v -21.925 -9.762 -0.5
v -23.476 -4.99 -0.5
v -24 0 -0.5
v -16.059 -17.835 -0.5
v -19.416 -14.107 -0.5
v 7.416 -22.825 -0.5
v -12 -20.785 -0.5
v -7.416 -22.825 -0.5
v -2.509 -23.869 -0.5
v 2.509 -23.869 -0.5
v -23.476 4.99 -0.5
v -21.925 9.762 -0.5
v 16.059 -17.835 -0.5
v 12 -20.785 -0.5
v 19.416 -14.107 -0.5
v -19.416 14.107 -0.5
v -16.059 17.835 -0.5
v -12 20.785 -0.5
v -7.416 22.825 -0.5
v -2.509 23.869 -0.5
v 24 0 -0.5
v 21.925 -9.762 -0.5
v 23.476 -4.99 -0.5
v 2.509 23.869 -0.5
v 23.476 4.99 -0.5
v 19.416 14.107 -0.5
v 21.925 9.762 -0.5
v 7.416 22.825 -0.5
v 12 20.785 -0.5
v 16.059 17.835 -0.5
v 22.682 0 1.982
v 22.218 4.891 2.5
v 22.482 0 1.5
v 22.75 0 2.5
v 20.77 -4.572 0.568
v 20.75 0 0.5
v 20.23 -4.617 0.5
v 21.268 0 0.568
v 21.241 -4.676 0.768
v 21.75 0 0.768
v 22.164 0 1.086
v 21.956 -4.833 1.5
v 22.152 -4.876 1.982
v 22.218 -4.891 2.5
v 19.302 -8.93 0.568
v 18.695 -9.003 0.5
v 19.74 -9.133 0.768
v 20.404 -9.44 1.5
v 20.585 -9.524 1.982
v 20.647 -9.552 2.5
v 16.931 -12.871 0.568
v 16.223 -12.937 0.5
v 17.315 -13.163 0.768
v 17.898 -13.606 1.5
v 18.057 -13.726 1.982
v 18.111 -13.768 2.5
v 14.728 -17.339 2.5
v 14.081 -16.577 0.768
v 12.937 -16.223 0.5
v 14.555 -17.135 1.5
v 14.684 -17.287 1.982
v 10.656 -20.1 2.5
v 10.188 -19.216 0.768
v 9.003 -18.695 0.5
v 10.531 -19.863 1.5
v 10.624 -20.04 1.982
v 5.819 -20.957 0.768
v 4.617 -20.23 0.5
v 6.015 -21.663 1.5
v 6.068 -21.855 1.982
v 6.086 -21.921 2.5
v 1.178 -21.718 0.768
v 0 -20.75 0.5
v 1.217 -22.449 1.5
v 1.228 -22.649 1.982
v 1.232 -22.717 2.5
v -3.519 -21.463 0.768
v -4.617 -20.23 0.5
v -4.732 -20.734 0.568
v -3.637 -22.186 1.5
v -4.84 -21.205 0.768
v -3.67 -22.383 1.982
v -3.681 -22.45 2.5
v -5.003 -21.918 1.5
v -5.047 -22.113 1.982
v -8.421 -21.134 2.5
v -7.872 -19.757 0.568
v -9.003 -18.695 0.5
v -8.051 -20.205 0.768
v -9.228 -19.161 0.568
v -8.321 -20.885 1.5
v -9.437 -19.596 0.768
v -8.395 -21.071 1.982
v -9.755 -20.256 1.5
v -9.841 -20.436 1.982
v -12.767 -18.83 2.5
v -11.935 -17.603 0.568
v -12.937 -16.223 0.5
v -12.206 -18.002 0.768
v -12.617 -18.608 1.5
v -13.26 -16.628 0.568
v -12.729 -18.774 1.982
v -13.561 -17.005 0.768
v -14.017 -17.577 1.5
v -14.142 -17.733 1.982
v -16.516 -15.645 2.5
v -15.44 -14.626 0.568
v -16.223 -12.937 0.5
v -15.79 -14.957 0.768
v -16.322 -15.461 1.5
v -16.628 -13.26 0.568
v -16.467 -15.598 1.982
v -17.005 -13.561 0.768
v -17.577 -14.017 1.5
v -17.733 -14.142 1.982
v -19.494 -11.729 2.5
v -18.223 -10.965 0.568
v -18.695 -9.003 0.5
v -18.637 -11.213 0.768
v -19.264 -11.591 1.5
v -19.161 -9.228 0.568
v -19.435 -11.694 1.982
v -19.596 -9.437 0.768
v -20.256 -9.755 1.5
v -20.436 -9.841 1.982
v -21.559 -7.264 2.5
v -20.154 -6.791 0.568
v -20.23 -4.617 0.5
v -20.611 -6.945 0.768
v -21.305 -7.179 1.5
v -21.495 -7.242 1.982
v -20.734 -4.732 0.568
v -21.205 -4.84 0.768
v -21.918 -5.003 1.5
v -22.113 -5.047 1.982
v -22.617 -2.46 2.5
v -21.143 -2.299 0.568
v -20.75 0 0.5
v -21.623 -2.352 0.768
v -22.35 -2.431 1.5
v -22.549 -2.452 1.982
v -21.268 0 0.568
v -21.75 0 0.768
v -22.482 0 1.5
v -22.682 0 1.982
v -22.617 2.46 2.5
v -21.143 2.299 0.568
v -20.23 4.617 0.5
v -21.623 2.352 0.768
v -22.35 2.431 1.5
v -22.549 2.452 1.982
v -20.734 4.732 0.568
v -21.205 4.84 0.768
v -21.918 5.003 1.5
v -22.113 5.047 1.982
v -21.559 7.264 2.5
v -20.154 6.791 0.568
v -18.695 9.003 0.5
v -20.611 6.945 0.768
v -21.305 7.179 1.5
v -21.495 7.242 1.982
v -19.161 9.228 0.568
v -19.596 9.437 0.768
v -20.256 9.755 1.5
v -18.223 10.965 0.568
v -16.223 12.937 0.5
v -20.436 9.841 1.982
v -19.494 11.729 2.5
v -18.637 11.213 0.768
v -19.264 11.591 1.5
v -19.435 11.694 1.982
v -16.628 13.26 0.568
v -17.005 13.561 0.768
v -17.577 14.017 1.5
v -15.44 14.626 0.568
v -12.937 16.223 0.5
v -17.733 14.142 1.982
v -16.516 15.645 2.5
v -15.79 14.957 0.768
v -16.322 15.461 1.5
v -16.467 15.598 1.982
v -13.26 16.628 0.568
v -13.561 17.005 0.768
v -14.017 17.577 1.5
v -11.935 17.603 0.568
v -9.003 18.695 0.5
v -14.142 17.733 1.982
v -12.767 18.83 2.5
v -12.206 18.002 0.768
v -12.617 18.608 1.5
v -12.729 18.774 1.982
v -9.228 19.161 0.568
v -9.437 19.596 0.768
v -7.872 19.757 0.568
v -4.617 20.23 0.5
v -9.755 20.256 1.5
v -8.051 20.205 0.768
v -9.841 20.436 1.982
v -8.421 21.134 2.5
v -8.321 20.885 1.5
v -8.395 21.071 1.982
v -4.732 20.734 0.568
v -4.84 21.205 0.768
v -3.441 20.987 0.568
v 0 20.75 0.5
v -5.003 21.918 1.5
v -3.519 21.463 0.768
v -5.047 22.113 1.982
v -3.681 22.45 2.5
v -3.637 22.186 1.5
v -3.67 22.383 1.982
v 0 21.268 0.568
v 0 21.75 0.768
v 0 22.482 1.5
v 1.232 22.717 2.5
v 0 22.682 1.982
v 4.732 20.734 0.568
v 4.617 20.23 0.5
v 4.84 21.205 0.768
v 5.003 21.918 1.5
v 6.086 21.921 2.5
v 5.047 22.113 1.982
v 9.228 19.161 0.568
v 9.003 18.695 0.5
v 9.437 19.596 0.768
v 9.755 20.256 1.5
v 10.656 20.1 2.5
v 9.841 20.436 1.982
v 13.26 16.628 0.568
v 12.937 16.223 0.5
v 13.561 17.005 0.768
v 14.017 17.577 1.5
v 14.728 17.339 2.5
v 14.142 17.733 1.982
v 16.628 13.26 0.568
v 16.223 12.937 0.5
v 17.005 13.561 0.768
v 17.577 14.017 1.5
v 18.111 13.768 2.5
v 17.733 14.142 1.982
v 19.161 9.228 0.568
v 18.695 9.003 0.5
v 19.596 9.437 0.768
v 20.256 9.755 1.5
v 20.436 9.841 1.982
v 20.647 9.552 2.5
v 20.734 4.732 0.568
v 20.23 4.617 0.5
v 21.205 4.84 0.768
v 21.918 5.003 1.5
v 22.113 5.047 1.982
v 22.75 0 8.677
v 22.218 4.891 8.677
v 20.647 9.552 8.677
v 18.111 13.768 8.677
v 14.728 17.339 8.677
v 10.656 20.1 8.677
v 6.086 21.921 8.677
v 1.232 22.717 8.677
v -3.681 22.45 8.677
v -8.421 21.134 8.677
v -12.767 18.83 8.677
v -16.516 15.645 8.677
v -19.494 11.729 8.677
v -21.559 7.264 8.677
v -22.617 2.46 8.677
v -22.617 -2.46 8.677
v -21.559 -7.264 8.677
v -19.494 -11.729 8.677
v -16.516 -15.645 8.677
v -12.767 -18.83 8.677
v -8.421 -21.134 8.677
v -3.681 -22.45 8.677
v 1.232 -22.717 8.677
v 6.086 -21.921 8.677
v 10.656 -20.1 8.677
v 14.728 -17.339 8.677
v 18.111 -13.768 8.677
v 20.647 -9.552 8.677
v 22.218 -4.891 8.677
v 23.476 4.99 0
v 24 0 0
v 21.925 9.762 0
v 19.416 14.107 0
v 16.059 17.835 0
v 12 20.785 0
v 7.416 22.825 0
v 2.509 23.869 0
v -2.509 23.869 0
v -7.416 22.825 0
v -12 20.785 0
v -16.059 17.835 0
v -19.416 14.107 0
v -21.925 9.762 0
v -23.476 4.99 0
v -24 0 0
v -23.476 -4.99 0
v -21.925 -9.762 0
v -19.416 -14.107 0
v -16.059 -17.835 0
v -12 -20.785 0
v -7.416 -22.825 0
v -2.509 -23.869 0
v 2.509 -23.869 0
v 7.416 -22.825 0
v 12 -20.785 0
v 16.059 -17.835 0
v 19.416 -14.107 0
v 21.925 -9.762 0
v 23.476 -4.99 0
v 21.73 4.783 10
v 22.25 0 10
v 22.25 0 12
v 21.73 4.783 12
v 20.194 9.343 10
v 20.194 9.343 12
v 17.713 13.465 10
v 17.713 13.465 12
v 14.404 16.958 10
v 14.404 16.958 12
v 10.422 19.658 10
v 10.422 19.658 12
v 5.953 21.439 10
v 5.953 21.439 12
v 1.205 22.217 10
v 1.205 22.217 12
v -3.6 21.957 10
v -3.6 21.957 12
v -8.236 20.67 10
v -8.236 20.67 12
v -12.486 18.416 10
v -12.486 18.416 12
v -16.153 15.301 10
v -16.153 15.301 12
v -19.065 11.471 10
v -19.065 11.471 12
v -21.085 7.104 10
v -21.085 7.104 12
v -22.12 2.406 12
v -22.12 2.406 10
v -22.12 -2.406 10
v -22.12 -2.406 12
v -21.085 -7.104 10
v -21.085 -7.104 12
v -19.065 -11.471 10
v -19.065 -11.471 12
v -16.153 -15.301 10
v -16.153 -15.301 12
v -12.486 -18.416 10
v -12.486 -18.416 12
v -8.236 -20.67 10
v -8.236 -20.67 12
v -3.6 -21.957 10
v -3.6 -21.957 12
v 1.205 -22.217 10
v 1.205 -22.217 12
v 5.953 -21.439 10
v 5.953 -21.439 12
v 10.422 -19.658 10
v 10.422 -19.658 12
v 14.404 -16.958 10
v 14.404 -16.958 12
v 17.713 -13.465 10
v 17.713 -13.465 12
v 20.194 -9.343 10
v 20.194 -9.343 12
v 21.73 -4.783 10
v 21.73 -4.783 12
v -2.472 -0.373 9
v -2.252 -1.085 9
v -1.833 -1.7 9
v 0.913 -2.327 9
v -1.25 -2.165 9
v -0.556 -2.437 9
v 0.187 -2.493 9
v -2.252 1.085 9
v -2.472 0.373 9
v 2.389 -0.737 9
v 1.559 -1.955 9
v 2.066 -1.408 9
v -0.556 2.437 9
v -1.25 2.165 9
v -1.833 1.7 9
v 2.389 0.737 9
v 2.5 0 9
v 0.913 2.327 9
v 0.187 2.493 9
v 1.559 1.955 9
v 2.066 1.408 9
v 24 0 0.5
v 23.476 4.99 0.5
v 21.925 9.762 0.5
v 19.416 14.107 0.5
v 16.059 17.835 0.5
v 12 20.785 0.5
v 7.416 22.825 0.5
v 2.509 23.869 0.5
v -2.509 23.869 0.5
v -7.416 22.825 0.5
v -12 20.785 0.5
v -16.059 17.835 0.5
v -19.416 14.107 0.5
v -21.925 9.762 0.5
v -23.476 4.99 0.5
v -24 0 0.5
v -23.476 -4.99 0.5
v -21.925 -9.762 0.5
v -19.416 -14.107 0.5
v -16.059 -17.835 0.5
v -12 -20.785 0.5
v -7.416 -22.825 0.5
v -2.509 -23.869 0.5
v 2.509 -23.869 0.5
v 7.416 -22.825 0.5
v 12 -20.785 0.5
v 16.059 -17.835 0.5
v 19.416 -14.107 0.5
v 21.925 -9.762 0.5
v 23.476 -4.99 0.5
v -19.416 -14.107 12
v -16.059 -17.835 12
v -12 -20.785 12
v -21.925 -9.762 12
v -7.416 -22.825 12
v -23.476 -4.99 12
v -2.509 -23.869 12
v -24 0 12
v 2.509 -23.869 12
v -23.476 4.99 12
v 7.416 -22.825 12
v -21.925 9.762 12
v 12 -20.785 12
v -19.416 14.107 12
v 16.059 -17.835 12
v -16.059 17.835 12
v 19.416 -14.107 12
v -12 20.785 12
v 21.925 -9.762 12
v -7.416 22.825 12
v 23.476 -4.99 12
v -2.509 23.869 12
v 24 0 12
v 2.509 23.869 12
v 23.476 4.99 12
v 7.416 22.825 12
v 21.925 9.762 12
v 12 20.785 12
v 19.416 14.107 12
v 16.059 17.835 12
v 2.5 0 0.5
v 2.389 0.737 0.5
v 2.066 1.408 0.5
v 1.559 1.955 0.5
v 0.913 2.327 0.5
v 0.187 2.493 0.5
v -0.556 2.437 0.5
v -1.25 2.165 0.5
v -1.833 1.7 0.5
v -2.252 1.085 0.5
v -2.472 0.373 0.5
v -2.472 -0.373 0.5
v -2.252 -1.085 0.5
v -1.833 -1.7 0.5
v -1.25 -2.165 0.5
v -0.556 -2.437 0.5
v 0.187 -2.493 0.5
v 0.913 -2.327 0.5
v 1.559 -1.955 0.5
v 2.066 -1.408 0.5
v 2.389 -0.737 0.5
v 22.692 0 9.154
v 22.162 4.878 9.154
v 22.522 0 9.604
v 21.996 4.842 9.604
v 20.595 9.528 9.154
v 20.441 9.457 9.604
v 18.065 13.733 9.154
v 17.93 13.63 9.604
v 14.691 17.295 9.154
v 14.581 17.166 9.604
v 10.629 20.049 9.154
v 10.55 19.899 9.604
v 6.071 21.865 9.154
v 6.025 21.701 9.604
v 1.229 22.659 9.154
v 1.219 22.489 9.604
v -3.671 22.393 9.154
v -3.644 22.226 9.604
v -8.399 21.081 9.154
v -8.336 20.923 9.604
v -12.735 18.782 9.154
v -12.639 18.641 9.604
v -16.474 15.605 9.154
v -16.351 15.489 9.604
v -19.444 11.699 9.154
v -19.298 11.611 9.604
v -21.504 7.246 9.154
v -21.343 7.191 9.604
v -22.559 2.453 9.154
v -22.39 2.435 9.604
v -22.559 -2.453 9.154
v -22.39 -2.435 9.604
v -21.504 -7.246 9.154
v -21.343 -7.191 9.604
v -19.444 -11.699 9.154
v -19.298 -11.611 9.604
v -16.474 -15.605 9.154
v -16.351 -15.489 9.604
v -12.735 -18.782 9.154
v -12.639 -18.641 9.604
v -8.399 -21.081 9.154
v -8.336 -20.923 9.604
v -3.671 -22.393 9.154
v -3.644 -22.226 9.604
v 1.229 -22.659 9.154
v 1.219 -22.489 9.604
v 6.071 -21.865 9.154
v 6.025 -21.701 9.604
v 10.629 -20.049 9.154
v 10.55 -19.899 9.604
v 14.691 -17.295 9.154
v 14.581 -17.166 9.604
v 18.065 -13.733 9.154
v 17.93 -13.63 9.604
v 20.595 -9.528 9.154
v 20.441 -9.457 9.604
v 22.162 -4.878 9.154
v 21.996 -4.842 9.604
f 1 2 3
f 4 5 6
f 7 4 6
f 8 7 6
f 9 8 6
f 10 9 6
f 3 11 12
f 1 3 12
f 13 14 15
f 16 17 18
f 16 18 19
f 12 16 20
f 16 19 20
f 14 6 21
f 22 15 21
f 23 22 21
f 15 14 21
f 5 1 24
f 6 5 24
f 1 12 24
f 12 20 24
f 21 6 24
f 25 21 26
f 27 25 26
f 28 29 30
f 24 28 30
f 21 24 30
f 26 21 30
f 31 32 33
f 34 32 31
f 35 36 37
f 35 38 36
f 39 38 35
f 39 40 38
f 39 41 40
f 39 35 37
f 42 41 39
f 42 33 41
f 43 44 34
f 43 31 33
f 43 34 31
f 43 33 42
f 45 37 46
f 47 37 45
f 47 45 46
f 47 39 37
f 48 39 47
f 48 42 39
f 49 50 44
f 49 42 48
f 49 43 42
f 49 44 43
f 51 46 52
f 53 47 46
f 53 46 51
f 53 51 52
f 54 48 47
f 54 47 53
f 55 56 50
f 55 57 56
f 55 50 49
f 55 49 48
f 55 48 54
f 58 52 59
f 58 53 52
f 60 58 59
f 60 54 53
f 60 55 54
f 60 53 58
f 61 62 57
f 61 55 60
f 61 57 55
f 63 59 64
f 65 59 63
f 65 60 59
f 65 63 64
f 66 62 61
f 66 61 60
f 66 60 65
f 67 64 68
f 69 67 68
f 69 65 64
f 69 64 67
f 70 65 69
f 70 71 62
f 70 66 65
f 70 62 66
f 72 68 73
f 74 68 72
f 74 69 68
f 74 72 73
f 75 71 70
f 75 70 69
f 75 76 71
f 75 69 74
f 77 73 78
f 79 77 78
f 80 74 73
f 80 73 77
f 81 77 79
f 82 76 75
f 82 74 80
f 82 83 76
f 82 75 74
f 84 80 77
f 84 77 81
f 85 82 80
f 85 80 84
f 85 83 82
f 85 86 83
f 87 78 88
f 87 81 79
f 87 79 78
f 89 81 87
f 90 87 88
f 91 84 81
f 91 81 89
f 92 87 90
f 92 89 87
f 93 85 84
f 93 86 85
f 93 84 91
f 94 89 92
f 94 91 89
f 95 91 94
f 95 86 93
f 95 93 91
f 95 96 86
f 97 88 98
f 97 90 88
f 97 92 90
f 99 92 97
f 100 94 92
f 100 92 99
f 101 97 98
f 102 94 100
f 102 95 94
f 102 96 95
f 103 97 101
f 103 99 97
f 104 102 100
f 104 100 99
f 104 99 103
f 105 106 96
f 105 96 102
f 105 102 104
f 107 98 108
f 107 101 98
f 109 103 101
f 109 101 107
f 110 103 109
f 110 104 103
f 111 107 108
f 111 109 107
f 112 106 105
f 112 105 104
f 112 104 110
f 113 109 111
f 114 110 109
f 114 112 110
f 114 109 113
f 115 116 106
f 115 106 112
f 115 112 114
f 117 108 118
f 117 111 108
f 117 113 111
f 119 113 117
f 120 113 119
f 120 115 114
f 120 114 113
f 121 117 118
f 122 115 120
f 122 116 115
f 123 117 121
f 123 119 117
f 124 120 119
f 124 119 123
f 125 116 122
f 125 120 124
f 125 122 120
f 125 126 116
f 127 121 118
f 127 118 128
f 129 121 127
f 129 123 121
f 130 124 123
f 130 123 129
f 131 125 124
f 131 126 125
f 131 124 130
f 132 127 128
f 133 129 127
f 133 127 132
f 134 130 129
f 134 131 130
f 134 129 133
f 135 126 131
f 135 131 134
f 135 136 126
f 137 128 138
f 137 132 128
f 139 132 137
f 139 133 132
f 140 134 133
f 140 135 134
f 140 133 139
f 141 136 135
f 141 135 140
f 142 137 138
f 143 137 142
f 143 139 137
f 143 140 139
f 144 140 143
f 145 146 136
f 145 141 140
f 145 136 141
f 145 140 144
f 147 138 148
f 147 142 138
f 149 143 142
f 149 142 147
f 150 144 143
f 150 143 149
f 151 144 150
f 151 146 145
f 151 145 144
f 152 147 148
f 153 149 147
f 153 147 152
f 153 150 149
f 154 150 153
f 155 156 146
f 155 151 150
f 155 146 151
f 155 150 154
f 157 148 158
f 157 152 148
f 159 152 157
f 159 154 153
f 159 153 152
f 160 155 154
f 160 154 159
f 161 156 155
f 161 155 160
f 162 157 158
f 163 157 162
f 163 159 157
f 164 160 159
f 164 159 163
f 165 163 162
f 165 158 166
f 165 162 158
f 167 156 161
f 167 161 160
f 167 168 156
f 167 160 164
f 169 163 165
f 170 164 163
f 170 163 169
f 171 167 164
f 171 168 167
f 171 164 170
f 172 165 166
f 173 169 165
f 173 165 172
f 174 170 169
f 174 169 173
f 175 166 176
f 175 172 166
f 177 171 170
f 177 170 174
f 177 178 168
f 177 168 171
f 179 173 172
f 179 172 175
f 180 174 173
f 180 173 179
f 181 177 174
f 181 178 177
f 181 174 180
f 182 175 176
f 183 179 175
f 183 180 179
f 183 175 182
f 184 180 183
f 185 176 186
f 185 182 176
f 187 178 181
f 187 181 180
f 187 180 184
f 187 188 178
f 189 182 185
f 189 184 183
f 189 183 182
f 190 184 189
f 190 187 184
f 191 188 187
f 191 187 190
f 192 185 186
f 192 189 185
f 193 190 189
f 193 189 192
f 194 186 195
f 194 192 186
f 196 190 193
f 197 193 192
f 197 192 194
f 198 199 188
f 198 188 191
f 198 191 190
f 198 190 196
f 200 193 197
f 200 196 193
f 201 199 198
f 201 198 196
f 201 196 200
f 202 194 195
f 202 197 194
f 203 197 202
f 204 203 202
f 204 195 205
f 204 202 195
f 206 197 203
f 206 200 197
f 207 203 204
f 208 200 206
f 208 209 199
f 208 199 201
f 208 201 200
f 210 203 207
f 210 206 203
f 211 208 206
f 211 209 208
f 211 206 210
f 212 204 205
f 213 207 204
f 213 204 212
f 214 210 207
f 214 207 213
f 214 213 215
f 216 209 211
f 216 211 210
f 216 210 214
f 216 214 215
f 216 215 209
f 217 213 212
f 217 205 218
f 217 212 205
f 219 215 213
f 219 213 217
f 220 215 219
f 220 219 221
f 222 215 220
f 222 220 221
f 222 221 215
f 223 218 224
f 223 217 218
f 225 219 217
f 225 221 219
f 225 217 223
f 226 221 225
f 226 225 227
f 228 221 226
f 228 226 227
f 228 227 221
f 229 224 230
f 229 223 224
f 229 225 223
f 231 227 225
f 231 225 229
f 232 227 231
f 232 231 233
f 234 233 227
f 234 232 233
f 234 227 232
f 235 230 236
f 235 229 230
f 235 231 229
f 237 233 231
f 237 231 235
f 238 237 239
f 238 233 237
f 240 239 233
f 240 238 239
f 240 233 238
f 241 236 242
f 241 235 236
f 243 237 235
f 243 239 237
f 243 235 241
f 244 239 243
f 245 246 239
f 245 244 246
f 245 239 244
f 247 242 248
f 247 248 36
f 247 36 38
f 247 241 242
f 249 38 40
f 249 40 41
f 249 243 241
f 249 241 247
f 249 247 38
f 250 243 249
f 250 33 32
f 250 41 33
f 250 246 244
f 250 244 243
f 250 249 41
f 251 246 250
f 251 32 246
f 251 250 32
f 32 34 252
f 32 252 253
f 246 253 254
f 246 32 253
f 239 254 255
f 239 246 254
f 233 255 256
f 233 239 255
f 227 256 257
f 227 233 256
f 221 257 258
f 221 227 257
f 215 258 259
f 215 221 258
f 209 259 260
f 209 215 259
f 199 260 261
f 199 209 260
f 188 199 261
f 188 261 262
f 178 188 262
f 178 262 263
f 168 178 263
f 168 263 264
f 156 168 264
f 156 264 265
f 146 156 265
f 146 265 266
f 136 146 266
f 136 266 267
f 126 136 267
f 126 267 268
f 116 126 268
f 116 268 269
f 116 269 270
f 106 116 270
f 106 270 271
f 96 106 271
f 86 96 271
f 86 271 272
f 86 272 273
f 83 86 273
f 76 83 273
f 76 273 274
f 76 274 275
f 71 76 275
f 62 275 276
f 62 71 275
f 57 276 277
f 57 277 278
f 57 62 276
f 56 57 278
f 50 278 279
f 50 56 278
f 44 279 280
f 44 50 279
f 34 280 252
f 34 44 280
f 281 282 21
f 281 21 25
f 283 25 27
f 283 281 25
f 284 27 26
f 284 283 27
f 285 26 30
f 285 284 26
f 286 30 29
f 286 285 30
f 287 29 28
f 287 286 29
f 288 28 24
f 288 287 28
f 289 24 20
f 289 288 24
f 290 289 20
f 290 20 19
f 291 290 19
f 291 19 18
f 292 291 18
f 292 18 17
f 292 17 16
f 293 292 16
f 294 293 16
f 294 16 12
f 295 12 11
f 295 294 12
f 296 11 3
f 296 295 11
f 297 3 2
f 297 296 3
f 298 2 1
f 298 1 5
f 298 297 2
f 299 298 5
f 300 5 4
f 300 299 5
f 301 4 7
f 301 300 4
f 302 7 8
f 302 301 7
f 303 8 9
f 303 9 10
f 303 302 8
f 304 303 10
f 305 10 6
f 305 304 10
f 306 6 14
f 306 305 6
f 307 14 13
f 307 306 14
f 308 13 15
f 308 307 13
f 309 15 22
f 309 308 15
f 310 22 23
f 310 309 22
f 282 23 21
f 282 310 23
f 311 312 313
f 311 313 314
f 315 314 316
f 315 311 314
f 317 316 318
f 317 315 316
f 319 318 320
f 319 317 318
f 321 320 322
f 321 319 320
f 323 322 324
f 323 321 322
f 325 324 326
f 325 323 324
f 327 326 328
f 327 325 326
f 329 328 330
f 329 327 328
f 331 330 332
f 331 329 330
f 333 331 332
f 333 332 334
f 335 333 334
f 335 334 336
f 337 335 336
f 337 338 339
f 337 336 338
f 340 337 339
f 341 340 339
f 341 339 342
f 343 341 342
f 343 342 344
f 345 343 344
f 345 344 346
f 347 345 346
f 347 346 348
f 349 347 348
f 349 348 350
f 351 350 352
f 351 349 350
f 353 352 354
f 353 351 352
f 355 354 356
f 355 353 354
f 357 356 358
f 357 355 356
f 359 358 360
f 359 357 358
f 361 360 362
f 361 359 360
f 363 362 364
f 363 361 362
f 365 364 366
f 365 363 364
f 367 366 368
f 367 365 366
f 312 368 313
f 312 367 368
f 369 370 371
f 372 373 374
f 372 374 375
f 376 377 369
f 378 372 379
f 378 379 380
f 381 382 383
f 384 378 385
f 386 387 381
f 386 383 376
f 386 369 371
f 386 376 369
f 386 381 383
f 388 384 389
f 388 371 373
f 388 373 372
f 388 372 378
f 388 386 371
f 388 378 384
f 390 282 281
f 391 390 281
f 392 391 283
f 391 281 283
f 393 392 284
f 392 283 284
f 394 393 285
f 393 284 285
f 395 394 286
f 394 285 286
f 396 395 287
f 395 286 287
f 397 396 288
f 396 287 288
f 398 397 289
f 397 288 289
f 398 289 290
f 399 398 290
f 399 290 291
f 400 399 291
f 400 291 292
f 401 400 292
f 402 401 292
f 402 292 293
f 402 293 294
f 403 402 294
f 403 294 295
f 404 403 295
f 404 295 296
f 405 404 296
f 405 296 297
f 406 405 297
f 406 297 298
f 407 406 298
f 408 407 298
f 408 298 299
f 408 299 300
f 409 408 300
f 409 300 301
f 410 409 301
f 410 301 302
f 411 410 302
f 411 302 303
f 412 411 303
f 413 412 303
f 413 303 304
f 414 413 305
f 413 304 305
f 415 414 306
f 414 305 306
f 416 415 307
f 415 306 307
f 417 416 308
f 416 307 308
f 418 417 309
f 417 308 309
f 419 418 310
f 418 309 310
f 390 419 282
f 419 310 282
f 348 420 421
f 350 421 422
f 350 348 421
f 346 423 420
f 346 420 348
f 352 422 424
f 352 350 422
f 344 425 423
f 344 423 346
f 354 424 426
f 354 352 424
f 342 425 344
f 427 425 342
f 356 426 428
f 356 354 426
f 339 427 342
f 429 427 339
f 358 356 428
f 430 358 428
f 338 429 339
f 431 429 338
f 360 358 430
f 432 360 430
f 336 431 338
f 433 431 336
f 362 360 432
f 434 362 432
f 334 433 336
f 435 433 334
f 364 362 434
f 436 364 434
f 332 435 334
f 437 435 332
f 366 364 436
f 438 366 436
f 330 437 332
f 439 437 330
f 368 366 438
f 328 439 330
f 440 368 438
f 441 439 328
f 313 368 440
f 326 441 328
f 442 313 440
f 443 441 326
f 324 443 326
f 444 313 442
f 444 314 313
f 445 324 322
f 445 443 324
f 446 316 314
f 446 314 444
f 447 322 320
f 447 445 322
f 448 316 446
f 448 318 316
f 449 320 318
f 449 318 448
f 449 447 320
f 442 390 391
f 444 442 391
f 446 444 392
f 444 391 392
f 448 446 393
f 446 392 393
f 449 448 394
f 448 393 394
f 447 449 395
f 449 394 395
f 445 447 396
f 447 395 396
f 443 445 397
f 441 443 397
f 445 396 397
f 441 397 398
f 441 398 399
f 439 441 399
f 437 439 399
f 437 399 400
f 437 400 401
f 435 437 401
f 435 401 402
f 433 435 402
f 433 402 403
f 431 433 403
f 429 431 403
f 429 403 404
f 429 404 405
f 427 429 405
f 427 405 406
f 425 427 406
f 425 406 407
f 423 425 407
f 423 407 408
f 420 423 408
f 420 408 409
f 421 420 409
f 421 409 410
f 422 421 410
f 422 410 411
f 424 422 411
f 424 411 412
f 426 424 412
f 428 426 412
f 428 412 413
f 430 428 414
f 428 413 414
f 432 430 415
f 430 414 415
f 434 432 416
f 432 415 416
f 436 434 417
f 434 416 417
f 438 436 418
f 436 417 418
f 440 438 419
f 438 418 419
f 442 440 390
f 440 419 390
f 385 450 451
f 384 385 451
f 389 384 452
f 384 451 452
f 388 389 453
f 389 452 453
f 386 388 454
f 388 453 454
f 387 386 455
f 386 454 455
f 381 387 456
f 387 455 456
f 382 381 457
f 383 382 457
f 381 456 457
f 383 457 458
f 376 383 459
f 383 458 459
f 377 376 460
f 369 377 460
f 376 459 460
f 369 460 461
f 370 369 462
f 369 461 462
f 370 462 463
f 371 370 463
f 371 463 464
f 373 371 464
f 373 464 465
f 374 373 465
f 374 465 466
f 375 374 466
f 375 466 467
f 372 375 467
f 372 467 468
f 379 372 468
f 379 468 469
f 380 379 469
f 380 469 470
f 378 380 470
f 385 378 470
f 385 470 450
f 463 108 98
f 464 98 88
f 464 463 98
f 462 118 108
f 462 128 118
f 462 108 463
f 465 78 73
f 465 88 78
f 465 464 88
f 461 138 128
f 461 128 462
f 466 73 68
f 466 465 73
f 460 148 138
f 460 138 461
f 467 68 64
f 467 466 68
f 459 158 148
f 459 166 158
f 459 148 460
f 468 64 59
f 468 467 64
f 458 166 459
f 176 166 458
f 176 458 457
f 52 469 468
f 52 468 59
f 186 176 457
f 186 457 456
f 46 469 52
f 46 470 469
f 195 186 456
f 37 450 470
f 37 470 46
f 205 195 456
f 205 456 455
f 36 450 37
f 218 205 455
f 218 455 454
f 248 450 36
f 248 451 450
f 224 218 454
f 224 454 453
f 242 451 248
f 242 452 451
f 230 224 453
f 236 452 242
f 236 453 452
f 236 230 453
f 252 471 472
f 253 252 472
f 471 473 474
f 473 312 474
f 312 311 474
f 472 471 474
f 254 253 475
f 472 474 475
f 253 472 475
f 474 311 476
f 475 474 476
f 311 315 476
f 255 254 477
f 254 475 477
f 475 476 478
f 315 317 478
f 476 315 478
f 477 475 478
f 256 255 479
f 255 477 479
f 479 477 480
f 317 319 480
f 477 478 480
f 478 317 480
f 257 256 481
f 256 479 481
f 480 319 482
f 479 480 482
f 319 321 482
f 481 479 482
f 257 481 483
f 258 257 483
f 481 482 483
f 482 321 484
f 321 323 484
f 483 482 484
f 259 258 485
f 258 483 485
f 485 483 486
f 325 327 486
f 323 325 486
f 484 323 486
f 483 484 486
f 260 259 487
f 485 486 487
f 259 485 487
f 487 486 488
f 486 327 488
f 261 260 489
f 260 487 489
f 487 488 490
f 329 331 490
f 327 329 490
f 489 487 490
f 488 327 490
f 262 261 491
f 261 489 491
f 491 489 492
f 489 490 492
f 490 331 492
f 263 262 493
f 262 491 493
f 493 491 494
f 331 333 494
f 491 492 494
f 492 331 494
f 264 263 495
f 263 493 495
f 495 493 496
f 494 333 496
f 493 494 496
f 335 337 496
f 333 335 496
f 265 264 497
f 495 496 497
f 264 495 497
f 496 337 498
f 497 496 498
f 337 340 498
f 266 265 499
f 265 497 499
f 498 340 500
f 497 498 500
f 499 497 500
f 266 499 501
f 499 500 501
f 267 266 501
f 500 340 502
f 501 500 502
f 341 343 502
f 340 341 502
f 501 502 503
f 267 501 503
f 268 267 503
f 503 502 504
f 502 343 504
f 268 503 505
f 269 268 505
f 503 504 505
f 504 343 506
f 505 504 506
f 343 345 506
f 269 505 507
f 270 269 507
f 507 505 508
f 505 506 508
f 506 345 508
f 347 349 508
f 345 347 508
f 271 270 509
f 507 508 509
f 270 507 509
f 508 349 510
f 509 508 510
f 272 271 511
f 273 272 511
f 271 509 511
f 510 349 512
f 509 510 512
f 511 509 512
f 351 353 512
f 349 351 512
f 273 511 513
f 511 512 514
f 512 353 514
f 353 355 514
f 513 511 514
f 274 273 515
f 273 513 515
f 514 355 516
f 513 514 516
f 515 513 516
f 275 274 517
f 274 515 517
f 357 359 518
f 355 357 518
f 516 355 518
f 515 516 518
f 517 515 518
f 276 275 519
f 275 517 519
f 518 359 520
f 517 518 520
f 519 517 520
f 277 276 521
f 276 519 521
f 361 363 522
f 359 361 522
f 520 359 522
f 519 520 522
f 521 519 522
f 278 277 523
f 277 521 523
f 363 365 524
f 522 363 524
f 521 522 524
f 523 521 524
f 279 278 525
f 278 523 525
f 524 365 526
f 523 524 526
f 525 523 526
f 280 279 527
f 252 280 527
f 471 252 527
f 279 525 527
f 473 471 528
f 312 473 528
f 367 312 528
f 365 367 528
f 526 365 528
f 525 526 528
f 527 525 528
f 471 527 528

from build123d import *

# Parameters (mm, degrees)
F0_R     = 24
F1_DEPTH = 12
F2_R     = 22.25
F3_DEPTH = 13
F5_R     = 22.75
F6_DEPTH = 10
F4_R     = 2.5
F7_DEPTH = 9
F8_R     = 24
F9_DEPTH = 0.5


# Not quite as in the source:
# - a fillet or chamfer that OpenCascade refuses, or shapes differently, is made with other operations: its cross-section is extruded or revolved along the edge and cut away or added


with BuildPart() as f1:
    # F0 (on Top) → F1 (new body)
    with BuildSketch(Plane.XY):
        Circle(F0_R)
    extrude(amount=F1_DEPTH)

    # F2 (on Top) → F3 (cut)
    with BuildSketch(Plane.XY):
        Circle(F2_R)
    extrude(amount=F3_DEPTH, mode=Mode.SUBTRACT)

    # F5 (on Top) → F6 (cut)
    with BuildSketch(Plane.XY):
        Circle(F5_R)
    extrude(amount=F6_DEPTH, mode=Mode.SUBTRACT)



with BuildPart() as f7:
    # F4 (on Top) → F7 (new body)
    with BuildSketch(Plane.XY):
        Circle(F4_R)
    extrude(amount=F7_DEPTH)


with BuildPart() as f1_1:
    add(f1.part)

    add(f7.part)  # F9 merges F7
    # F8 (on Top) → F9 (join, symmetric)
    with BuildSketch(Plane.XY):
        Circle(F8_R)
    extrude(amount=F9_DEPTH, both=True)

    # F10: fillet of radius 2 on 3 edges, made by hand

    # F10_s1 → F10_t2 (revolve)
    with BuildSketch(Plane.XZ):
        with BuildLine():
            ThreePointArc((20.75, 0.5), (22.1642135624, 1.0857864376), (22.75, 2.5))
            Line((22.75, 2.5), (22.75, 0.5))
            Line((22.75, 0.5), (20.75, 0.5))
        make_face()
    revolve(axis=Axis((0, 0, 0.5), (0, 0, -1)))

    # F10_s3 → F10_t4 (revolve)
    with BuildSketch(Plane.XZ):
        with BuildLine():
            ThreePointArc((22.75, 8.6771243445), (22.6208286934, 9.3842311257), (22.25, 10))
            Line((22.25, 10), (22.75, 10))
            Line((22.75, 10), (22.75, 8.6771243445))
        make_face()
    revolve(axis=Axis((0, 0, 10), (0, 0, 1)))


solid = f1_1.part
